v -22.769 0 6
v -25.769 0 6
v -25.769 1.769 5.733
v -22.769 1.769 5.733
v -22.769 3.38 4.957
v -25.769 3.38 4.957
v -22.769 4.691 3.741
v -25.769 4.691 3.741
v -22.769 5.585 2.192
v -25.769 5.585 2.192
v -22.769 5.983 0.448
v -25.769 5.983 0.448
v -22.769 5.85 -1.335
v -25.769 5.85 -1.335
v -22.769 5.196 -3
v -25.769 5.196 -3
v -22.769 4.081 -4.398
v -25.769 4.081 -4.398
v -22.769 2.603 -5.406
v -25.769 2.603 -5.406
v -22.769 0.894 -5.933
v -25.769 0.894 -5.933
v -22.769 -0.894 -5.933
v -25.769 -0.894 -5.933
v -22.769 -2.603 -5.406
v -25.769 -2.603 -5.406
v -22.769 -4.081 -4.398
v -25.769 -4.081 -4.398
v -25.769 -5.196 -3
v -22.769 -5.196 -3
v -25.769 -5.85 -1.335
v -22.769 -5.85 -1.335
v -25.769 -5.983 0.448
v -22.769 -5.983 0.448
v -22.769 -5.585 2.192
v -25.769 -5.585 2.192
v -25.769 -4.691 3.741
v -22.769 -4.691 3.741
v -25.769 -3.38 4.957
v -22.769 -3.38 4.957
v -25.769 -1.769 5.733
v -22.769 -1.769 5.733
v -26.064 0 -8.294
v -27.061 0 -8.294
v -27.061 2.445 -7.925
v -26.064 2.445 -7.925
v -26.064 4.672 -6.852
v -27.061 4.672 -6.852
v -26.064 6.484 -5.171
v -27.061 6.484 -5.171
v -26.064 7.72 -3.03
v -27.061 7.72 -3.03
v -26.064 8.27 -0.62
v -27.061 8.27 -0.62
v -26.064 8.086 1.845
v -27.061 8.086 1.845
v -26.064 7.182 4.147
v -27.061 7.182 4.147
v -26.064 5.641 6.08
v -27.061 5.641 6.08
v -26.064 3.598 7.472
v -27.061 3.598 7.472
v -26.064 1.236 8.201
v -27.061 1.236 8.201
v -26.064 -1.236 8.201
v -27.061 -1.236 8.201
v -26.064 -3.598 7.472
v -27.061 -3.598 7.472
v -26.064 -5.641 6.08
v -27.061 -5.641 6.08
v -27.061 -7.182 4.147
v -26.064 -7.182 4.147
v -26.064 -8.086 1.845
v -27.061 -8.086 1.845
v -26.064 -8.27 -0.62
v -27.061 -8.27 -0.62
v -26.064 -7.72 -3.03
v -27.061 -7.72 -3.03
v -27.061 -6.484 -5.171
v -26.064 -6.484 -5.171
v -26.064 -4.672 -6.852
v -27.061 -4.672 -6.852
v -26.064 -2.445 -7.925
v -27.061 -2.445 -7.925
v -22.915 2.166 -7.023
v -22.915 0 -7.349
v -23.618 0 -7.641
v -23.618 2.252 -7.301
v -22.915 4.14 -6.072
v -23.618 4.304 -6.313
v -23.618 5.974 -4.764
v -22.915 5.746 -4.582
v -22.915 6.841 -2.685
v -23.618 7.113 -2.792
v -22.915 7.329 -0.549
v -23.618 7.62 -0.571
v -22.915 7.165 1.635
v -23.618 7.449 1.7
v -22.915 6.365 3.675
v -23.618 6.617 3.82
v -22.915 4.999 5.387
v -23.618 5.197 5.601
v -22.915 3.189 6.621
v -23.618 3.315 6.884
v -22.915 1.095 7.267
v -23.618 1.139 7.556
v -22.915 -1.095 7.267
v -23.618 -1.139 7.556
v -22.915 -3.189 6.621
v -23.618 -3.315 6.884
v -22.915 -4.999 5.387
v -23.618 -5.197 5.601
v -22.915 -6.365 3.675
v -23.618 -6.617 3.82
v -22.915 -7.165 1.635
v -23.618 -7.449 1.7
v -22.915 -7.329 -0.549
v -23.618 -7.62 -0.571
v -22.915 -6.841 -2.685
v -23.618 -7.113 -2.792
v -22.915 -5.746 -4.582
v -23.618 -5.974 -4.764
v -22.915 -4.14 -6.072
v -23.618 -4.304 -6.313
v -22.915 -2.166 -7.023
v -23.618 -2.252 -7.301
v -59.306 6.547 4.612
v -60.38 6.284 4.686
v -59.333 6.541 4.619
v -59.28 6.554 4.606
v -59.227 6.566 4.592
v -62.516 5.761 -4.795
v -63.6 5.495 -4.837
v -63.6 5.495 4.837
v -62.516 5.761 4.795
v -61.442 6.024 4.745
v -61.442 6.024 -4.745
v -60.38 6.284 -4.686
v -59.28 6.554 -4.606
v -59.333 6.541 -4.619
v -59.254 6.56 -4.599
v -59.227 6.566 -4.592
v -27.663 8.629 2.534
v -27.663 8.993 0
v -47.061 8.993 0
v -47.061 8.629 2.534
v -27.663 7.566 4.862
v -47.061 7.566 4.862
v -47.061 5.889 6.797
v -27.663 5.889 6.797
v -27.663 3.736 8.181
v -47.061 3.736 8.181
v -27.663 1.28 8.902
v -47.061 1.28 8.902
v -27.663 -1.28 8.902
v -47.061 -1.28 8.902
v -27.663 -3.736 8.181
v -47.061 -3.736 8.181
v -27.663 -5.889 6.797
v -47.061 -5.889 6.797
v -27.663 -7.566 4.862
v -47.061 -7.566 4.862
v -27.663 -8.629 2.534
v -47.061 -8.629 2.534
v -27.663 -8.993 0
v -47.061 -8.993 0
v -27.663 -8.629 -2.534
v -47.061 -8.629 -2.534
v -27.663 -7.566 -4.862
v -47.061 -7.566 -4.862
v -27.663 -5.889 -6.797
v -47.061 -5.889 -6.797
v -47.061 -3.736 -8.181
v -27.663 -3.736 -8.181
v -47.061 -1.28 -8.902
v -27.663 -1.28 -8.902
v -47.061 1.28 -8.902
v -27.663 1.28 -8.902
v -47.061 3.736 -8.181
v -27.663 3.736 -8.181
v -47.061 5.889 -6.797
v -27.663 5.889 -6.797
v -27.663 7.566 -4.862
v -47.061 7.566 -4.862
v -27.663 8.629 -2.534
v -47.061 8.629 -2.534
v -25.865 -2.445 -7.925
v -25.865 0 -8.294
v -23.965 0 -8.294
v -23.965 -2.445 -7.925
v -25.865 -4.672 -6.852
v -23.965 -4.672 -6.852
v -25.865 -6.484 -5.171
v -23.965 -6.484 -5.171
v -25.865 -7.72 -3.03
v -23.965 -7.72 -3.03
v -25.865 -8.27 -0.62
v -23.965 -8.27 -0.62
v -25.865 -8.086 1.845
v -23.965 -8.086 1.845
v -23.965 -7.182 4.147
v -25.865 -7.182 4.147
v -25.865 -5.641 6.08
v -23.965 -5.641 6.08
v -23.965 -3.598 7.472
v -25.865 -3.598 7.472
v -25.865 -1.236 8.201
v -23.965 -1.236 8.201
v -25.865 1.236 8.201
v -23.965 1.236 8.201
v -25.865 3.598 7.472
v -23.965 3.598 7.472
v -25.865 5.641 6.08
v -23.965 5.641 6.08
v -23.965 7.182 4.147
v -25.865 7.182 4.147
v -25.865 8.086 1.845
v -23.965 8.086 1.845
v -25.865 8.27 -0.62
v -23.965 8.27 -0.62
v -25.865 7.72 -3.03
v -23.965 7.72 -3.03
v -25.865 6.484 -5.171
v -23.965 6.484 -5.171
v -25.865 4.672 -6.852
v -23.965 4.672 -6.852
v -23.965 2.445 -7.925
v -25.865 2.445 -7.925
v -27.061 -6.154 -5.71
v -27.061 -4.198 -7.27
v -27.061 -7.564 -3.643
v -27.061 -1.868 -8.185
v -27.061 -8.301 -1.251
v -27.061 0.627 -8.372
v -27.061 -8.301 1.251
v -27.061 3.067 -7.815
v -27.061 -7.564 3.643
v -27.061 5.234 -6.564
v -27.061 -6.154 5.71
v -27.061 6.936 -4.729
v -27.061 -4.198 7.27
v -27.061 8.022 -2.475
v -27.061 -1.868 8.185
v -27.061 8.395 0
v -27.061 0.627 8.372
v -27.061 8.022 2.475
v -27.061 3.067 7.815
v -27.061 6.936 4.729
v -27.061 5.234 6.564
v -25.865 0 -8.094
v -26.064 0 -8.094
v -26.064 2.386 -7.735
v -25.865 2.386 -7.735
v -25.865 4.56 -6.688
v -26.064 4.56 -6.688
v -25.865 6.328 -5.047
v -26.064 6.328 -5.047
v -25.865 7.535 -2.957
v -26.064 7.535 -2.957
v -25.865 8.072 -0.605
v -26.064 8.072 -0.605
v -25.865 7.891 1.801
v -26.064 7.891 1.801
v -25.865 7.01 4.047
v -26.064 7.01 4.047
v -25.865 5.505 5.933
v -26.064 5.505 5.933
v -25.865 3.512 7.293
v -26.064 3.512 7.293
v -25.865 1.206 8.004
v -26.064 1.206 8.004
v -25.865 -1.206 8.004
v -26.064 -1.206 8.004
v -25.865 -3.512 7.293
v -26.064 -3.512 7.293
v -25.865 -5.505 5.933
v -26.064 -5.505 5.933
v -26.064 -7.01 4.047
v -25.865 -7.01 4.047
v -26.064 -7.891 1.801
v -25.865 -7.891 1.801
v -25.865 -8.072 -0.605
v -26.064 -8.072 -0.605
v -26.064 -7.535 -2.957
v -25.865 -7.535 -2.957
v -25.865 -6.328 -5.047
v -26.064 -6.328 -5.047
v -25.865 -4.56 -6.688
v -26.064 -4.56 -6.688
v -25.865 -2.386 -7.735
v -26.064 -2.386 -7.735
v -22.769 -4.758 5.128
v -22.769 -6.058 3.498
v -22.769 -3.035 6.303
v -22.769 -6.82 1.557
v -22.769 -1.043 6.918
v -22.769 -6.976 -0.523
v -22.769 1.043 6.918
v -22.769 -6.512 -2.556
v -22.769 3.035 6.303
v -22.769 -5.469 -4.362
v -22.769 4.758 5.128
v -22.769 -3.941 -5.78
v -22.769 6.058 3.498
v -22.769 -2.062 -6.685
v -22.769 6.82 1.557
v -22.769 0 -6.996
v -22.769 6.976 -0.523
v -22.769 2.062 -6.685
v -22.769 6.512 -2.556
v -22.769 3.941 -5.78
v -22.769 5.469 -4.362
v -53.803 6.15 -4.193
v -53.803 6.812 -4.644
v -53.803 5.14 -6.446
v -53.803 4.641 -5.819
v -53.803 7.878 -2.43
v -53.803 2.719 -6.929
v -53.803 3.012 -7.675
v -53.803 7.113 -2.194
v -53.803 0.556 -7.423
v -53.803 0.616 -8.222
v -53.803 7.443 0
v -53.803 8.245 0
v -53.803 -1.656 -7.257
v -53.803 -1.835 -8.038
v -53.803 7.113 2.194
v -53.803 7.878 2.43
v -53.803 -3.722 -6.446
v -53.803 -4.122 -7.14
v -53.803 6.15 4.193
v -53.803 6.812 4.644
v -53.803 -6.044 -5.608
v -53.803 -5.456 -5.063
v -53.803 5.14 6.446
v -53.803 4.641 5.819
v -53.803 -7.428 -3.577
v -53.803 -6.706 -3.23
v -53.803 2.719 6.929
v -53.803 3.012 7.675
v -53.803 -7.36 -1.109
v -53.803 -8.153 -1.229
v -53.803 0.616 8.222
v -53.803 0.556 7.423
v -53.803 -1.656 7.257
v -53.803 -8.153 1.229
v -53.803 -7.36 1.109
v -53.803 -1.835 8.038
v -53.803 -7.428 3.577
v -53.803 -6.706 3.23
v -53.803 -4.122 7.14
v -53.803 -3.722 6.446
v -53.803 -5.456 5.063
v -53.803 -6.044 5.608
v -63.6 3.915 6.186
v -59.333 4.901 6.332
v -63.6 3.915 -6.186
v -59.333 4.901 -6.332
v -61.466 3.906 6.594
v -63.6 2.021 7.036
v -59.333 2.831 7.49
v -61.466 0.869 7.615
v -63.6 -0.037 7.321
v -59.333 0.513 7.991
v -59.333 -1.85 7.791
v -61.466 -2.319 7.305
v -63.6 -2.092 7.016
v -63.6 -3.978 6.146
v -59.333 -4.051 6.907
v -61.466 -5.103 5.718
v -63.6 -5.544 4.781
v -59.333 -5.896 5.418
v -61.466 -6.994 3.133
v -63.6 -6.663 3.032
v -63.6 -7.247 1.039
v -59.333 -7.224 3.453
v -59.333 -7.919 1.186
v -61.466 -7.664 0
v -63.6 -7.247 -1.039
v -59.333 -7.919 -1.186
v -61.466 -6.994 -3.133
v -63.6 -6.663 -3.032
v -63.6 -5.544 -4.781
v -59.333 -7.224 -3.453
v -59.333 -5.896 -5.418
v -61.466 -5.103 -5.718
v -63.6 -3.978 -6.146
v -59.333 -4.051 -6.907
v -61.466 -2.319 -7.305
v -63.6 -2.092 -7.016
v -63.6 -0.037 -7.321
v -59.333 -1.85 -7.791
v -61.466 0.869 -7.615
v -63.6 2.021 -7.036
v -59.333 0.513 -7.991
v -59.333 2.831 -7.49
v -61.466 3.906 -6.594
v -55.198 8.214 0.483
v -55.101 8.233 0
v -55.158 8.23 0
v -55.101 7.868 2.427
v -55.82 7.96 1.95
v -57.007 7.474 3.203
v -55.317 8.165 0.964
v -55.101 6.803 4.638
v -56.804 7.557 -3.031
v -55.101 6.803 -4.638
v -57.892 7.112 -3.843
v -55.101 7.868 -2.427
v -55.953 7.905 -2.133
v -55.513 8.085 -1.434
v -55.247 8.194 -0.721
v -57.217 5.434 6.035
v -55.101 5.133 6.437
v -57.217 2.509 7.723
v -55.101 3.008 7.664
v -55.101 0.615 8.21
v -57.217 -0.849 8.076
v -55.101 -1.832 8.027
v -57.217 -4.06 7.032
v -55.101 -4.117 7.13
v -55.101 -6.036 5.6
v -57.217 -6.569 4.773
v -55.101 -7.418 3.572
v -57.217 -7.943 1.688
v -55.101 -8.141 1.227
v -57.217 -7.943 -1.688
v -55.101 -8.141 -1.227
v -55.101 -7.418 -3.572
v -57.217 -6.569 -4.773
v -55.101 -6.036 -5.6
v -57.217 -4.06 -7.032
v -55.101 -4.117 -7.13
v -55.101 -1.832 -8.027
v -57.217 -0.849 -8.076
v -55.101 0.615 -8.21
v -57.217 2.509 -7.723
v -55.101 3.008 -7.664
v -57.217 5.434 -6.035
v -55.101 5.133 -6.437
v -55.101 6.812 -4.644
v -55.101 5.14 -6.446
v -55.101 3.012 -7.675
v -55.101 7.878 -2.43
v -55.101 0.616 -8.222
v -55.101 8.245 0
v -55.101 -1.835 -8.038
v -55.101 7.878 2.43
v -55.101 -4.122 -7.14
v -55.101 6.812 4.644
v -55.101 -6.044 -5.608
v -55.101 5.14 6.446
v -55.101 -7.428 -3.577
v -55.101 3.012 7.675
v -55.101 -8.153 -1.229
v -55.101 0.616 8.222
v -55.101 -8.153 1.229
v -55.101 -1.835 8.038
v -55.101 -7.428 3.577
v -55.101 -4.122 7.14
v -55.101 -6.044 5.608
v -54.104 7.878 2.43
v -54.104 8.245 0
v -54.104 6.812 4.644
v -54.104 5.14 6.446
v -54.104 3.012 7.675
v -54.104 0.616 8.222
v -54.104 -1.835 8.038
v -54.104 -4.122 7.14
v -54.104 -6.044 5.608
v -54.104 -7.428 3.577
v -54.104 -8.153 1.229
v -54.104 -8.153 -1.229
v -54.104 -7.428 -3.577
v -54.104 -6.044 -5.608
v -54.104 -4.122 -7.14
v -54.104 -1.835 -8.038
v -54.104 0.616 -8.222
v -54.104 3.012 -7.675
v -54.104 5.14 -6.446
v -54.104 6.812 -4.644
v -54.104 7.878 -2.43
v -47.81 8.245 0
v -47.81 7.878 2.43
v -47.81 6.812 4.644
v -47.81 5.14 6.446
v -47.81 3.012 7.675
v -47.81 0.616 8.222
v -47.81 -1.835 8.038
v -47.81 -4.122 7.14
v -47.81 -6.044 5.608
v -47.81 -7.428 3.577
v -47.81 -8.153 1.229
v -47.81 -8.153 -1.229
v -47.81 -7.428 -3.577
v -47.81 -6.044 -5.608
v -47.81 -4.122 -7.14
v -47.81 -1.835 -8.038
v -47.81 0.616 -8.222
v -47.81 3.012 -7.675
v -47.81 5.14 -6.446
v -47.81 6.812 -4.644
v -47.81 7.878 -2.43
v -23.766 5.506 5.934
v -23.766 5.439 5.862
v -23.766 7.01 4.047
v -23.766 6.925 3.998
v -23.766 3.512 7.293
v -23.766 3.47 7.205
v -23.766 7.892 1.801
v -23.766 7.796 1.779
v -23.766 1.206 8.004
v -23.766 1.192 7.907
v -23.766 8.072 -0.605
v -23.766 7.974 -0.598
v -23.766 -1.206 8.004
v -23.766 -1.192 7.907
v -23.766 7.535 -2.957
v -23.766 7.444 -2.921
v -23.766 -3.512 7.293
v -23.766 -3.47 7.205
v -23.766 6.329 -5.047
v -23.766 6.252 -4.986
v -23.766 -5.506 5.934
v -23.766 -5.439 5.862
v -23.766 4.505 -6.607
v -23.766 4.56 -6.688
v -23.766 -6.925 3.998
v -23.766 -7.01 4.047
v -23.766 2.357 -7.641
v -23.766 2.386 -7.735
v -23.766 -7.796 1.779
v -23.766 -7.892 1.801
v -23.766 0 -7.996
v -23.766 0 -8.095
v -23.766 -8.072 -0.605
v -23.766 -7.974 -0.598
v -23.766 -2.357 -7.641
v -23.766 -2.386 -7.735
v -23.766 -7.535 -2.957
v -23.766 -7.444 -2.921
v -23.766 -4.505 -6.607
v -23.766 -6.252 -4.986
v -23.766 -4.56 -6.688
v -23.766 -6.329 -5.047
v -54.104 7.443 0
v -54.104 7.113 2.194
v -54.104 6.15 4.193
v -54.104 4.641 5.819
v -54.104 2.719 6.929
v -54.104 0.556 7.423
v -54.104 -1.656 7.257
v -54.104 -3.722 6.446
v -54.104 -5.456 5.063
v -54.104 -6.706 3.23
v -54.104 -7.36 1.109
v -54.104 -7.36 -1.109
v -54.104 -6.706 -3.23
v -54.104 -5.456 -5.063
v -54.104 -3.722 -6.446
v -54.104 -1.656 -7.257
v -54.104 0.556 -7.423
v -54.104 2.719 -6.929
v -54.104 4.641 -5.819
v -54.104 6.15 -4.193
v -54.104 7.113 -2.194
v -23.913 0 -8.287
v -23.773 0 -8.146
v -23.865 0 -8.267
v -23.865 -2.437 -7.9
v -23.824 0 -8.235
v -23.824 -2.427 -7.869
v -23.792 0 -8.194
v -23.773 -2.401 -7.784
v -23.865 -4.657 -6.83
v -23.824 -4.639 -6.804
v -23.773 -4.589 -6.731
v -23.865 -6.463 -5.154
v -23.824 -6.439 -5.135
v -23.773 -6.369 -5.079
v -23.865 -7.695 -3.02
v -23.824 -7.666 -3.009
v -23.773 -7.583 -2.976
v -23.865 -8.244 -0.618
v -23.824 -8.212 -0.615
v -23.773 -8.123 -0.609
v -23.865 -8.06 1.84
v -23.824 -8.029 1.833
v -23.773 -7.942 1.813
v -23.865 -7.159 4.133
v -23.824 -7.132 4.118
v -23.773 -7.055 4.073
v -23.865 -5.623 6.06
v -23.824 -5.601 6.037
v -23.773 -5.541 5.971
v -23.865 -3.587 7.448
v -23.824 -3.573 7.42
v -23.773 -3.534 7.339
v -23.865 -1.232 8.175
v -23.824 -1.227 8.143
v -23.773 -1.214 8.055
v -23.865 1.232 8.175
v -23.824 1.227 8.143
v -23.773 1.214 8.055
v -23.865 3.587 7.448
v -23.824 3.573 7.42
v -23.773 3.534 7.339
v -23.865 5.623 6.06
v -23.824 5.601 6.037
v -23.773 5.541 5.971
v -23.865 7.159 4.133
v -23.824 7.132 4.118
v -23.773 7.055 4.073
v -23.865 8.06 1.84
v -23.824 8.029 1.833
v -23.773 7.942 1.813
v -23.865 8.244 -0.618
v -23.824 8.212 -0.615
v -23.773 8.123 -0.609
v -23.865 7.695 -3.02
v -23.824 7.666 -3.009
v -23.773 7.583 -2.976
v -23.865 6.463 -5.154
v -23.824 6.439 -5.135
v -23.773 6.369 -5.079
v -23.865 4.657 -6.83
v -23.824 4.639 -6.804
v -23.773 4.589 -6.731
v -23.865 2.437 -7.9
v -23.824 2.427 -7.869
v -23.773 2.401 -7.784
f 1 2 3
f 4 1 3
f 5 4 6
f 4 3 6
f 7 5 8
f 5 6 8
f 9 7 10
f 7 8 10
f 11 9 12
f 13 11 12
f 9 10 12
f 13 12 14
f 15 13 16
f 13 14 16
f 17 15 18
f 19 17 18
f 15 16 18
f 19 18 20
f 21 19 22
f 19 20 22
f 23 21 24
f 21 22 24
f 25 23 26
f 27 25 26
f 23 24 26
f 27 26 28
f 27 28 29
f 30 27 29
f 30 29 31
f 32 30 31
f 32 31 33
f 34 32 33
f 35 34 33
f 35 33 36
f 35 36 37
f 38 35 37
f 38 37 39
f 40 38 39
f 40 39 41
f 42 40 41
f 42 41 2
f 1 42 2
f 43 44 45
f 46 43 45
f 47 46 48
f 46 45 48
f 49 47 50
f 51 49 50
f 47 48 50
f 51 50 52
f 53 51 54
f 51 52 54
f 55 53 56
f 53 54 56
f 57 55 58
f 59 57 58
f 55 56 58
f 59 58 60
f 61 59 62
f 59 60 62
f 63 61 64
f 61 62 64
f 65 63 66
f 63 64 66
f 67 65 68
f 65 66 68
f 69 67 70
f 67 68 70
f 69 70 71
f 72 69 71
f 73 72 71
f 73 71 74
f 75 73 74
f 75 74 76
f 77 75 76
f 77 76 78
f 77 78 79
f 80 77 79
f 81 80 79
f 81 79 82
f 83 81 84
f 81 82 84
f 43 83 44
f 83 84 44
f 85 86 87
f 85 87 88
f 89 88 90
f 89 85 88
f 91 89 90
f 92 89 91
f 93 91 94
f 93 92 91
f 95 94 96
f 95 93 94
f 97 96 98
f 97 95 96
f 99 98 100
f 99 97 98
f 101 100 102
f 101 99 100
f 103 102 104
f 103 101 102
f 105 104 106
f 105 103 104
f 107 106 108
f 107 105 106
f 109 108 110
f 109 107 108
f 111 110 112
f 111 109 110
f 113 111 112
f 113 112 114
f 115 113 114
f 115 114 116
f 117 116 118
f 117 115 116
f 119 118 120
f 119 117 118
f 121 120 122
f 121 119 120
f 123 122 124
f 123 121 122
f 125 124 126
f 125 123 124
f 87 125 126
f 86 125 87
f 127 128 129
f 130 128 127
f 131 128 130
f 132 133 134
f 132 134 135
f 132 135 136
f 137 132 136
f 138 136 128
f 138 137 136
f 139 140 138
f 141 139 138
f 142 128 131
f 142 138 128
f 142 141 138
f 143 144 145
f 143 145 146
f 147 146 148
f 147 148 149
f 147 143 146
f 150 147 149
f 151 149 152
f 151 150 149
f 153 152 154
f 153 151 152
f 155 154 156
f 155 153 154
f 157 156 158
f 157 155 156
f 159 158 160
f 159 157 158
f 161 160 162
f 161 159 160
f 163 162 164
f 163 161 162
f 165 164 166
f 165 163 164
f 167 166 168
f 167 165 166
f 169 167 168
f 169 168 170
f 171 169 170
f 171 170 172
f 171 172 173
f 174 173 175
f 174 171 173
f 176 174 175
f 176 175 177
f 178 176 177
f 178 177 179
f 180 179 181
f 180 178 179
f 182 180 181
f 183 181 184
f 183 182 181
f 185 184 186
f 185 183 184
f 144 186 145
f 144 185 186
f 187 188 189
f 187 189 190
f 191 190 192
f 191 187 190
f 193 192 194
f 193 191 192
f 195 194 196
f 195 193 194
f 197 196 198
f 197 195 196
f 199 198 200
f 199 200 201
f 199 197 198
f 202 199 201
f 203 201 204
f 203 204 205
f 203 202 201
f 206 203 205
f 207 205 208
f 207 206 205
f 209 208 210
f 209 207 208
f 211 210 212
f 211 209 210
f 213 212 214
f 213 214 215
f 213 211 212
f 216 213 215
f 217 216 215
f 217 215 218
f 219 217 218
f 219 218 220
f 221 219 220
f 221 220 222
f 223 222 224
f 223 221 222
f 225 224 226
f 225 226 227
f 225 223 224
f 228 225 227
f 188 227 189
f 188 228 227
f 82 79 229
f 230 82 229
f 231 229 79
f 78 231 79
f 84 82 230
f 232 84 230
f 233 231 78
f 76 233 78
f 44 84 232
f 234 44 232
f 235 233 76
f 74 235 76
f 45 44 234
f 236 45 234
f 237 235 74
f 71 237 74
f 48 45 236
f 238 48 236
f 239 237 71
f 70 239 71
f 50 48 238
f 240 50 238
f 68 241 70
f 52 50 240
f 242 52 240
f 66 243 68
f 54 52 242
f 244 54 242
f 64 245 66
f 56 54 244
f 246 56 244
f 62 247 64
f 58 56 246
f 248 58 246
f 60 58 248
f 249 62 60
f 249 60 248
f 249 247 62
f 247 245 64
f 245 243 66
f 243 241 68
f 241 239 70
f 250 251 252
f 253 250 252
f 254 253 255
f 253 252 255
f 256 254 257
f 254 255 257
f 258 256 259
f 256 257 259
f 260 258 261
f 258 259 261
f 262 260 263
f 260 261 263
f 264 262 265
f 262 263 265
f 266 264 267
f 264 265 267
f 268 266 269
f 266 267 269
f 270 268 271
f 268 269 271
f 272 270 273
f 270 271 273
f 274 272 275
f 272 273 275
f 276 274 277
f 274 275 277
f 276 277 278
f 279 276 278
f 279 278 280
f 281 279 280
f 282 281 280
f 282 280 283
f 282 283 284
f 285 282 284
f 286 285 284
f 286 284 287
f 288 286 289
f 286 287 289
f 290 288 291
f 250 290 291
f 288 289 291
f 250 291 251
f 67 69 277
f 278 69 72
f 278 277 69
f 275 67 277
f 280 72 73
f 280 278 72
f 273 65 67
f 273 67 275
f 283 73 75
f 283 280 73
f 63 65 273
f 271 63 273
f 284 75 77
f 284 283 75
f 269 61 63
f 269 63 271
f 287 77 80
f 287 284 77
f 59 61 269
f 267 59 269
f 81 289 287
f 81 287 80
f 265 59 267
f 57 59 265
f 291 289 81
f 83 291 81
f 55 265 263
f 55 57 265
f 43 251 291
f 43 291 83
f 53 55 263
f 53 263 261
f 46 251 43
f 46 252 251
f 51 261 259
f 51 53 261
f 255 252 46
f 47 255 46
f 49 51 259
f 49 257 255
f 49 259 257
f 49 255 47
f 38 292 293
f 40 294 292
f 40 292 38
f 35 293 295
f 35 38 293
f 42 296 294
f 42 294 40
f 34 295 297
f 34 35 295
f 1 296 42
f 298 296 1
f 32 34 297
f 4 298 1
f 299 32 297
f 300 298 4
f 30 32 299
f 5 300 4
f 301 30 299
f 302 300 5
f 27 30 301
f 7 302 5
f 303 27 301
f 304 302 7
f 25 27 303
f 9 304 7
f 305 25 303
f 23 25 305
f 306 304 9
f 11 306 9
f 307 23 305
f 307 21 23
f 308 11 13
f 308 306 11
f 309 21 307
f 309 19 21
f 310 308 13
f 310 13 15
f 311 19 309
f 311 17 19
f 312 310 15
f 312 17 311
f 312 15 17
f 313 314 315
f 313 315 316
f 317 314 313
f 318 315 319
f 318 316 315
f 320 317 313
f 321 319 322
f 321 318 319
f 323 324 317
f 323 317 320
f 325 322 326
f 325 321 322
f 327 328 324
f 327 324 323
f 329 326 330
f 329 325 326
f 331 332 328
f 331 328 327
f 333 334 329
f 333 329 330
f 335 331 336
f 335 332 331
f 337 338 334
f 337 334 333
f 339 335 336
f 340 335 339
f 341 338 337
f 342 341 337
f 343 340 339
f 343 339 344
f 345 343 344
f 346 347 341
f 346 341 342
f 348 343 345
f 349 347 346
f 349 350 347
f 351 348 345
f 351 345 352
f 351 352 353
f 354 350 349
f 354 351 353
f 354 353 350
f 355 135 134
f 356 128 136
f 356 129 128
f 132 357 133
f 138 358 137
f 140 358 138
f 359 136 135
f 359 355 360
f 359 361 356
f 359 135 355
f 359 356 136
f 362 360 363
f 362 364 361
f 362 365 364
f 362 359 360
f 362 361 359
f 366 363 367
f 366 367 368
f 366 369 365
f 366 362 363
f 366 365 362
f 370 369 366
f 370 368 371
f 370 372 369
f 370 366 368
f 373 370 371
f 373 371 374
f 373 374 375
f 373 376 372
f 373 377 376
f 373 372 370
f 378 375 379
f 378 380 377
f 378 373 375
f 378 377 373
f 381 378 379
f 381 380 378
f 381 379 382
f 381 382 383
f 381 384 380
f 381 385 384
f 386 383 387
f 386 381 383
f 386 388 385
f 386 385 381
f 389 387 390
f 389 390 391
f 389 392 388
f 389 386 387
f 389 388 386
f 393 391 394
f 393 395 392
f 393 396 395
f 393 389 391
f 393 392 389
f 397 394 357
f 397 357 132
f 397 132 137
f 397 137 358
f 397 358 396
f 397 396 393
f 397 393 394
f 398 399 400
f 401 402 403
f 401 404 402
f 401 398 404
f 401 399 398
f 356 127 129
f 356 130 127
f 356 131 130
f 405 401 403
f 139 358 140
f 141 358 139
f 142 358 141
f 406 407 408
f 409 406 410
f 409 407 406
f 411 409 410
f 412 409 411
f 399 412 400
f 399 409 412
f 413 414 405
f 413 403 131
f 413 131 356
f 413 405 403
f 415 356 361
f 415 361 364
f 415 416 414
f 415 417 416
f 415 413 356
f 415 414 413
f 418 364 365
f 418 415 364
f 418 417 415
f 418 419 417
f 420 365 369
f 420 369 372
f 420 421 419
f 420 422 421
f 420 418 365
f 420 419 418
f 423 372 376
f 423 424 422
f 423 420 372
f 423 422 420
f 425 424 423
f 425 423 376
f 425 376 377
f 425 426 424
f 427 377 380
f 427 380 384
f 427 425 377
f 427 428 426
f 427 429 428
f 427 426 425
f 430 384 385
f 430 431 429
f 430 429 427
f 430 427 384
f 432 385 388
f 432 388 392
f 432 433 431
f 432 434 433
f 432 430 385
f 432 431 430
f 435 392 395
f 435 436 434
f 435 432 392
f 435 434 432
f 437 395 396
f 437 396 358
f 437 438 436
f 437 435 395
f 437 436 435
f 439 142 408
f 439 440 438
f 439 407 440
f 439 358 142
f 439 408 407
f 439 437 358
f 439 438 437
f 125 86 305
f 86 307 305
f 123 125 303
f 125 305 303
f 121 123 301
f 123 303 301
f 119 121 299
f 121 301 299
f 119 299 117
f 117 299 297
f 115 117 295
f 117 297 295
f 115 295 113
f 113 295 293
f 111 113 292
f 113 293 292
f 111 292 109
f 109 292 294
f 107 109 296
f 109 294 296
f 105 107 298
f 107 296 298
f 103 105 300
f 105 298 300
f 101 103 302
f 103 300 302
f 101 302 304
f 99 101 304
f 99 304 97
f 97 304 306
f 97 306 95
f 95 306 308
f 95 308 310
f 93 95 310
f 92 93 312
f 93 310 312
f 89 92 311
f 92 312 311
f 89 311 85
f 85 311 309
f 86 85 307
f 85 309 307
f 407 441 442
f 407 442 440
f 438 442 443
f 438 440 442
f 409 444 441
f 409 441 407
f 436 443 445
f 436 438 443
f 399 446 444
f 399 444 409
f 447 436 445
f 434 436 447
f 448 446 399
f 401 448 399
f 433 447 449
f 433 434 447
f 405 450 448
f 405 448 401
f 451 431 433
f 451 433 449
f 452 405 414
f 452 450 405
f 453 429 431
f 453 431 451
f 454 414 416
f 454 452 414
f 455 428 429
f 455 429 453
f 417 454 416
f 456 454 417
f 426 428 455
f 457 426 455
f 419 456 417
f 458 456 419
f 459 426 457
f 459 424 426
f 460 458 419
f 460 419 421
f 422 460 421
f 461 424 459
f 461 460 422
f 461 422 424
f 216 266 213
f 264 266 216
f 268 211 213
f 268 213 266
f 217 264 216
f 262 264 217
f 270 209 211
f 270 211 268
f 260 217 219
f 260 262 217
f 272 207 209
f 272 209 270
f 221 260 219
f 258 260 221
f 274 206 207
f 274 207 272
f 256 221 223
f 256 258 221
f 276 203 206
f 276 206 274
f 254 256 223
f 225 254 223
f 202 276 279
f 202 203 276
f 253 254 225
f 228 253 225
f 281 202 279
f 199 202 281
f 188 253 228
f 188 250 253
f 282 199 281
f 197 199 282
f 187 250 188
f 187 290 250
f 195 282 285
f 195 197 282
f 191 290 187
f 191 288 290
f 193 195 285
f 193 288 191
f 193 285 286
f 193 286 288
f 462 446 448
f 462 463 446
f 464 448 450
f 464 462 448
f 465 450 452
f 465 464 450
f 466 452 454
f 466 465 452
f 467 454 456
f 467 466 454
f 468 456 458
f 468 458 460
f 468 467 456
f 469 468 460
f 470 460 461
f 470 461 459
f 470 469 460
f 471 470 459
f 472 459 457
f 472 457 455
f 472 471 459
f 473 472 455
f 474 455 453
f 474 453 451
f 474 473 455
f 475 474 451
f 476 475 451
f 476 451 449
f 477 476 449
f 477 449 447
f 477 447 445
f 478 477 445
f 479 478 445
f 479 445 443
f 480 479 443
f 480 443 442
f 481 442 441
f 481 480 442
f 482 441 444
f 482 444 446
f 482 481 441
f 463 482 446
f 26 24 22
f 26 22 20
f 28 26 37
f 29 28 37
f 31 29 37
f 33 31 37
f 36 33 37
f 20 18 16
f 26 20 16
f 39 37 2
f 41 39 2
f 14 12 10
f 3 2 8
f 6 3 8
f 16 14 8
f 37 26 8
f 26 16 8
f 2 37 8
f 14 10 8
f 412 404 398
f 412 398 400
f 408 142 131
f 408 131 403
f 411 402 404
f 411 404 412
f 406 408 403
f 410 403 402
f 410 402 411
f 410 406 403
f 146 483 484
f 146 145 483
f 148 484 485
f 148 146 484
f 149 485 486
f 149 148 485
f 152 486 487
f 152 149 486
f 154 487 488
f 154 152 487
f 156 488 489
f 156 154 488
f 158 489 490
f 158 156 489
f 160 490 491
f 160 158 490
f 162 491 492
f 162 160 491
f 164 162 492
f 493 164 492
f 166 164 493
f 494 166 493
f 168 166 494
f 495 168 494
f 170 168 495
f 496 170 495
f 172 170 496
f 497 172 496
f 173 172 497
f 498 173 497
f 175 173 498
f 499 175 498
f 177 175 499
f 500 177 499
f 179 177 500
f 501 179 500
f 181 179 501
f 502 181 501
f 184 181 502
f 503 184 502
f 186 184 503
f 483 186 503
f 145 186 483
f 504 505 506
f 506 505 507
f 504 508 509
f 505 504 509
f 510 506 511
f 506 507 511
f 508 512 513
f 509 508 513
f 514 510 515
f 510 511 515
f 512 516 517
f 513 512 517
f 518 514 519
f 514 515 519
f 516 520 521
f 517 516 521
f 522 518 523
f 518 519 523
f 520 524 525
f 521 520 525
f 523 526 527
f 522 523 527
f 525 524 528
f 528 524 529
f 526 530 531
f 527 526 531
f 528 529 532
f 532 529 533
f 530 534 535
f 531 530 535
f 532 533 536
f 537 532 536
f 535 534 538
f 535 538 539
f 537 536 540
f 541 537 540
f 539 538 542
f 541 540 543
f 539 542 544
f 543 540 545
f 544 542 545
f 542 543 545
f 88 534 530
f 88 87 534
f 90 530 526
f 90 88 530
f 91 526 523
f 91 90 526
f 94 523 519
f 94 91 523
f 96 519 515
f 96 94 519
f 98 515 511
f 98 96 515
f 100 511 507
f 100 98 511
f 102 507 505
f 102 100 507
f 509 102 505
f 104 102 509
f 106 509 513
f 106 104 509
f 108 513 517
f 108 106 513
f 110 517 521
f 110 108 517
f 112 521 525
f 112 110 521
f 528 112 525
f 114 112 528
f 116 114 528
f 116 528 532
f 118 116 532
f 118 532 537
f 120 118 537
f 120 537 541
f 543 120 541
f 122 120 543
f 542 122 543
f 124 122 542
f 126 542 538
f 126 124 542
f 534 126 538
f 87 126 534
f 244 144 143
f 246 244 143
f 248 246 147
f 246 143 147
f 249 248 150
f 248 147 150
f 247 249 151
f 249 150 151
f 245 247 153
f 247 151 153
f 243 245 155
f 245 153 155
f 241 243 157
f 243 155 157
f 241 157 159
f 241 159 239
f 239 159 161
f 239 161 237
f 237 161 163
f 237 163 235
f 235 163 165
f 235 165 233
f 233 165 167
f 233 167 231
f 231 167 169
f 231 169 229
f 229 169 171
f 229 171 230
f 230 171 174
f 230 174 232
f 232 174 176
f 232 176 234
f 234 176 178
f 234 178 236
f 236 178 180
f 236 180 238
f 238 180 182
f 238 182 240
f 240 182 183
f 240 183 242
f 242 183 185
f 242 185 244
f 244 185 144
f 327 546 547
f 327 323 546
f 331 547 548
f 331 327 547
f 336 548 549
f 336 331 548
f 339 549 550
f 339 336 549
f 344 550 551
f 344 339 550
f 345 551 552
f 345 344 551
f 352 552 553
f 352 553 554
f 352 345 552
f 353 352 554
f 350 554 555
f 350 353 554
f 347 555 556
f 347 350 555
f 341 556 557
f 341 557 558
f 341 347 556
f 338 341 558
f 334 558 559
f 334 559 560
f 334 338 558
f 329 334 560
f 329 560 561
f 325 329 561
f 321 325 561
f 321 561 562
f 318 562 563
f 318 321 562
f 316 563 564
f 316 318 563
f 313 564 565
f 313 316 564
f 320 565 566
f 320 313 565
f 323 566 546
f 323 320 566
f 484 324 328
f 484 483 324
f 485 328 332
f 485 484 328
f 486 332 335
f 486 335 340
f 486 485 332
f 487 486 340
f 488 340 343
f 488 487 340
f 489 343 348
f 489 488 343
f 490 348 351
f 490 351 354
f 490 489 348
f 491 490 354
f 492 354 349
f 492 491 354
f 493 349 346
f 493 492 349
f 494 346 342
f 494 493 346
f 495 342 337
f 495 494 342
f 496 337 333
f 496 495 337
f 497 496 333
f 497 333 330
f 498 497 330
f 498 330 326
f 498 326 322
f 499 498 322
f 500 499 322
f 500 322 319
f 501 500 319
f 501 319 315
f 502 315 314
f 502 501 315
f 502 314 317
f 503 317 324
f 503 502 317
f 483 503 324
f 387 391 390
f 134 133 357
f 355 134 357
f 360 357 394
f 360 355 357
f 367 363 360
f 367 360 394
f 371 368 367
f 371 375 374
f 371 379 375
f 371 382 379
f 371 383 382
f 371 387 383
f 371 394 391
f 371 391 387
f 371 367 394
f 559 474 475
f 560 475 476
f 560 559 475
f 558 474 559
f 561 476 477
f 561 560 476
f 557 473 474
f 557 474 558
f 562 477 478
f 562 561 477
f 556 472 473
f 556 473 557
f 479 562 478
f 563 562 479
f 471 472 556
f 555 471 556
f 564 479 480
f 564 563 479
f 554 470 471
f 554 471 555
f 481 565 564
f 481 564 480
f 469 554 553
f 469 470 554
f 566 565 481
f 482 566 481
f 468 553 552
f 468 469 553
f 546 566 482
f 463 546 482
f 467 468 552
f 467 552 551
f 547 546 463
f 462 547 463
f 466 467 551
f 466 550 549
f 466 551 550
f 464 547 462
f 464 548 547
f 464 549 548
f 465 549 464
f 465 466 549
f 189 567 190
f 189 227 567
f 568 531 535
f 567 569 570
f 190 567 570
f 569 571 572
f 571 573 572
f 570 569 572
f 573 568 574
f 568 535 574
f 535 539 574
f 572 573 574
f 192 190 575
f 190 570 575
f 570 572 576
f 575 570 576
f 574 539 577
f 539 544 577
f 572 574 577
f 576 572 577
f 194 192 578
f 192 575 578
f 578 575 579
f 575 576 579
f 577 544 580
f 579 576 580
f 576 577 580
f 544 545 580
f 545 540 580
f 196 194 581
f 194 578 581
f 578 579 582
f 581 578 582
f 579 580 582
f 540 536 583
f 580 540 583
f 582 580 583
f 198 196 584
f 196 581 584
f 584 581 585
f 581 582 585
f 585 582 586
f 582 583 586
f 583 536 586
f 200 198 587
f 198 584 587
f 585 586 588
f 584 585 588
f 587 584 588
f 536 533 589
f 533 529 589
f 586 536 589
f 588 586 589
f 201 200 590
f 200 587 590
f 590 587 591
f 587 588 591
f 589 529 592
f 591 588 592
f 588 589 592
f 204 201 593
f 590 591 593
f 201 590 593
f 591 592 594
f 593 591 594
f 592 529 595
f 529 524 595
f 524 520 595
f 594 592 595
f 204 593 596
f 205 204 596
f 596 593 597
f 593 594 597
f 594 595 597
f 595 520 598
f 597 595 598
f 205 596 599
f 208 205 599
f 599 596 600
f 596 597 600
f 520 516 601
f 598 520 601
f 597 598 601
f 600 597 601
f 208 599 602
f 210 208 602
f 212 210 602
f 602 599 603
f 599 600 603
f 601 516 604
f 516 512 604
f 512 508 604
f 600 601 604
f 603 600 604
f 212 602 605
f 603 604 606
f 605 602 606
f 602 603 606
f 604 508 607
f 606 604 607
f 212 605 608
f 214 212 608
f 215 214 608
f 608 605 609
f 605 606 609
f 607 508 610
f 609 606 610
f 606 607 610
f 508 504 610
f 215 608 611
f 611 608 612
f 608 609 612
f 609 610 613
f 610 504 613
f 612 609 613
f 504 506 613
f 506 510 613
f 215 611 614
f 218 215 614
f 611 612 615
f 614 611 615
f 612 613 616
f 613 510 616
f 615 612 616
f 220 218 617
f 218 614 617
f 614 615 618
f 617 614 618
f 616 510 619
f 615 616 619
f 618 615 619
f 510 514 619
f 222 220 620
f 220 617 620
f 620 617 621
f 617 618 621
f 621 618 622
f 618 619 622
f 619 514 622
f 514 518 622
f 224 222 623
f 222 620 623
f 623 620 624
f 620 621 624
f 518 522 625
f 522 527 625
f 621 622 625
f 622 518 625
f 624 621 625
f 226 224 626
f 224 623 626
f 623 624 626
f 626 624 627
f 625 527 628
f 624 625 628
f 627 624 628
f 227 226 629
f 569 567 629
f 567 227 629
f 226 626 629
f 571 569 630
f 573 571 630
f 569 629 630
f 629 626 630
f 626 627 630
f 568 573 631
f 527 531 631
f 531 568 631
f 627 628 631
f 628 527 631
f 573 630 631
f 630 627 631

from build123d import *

# Parameters (mm, degrees)
SALIENTE_EXTRUIR1_START             = -7.320816359
SALIENTE_EXTRUIR1_3_DEPTH           = 14.641632718
CROQUIS2_R                          = 8.293601056
SALIENTE_EXTRUIR2_DEPTH             = 0.996962704
CROQUIS3_R                          = 8.094208515
SALIENTE_EXTRUIR3_DEPTH             = 0.199392541
CROQUIS4_R                          = 8.293601056
SALIENTE_EXTRUIR4_DEPTH             = 2.099264862
CROQUIS6_R                          = 7.996393307
SALIENTE_EXTRUIR6_DEPTH             = 0.147505067
SALIENTE_EXTRUIR6_TAPER             = 67.466749921
CROQUIS7_R                          = 7.640868273
SALIENTE_EXTRUIR7_DEPTH             = 0.849457636
SALIENTE_EXTRUIR7_TAPER             = 22.533250079
DI_METRO_DE_TALADRO_12_0_12_1_D     = 12
DI_METRO_DE_TALADRO_12_0_12_1_DEPTH = 3
CHAFL_N1_SIZE                       = 0.598177622
CHAFL_N1_SIZE2                      = 0.601939746
CHAFL_N2_SIZE                       = 0.158849839
CHAFL_N2_SIZE_2                     = 0.292765242
REDONDEO1_R                         = 0.199050823


with BuildPart() as part:
    # Saliente-Extruir1: read off the stored shape, not the designer's step
    # Saliente-Extruir1 outline → Saliente-Extruir1 (revolve)
    with BuildSketch(Plane.YX):
        Polygon((8.99335601, -27.061359261), (0, -27.061359261), (0, -55.101016987), (8.244693452, -55.101016987), (8.244693452, -54.104054283), (7.443361166, -54.104054283), (7.443361166, -53.803084411), (8.244693452, -53.803084411), (8.244693452, -47.810021819), (8.99335601, -47.061359261), align=None)
    revolve(axis=Axis((0, 0, 0), (1, 0, 0)))

    # Saliente-Extruir1 2 outline → Saliente-Extruir1 2 (revolve)
    with BuildSketch(Plane.YX):
        Polygon((0, -55.101016987), (0, -63.6), (7.320816359, -63.6), (8.007236046, -59.33292836), (8.233407082, -55.101016987), align=None)
    revolve(axis=Axis((0, 0, 0), (1, 0, 0)))

    # Saliente-Extruir1 3 outline → Saliente-Extruir1 3 (cut)
    with BuildSketch(Plane.XY.offset(SALIENTE_EXTRUIR1_START)):
        Polygon((-63.6, 5.495125364), (-59.227359982, 6.566499061), (-55.157899775, 8.230367028), (-54, 8.70379403), (-54, 10), (-63.6, 10), align=None)
    extrude(amount=SALIENTE_EXTRUIR1_3_DEPTH, mode=Mode.SUBTRACT)

    # Croquis2 → Saliente-Extruir2 (add)
    with BuildSketch(Plane(origin=(-27.061359261, 0, 0), x_dir=(0, 0, -1), z_dir=(1, 0, 0))):
        Circle(CROQUIS2_R)
    extrude(amount=SALIENTE_EXTRUIR2_DEPTH)

    # Croquis3 → Saliente-Extruir3 (add)
    with BuildSketch(Plane(origin=(-26.064396557, 0, 0), x_dir=(0, 0, -1), z_dir=(1, 0, 0))):
        Circle(CROQUIS3_R)
    extrude(amount=SALIENTE_EXTRUIR3_DEPTH)

    # Croquis4 → Saliente-Extruir4 (add)
    with BuildSketch(Plane(origin=(-25.865004017, 0, 0), x_dir=(0, -1, 0), z_dir=(-1, 0, 0))):
        with Locations(Location((0, 0, 0), (0, 0, 270))):
            Circle(CROQUIS4_R)
    extrude(amount=-SALIENTE_EXTRUIR4_DEPTH)

    # Croquis6 → Saliente-Extruir6 (add)
    with BuildSketch(Plane(origin=(-23.765739154, 0, 0), x_dir=(0, 0, -1), z_dir=(1, 0, 0))):
        Circle(CROQUIS6_R)
    extrude(amount=SALIENTE_EXTRUIR6_DEPTH, taper=SALIENTE_EXTRUIR6_TAPER)

    # Croquis7 → Saliente-Extruir7 (add)
    with BuildSketch(Plane(origin=(-23.618234087, 0, 0), x_dir=(0, 0, -1), z_dir=(1, 0, 0))):
        Circle(CROQUIS7_R)
    extrude(amount=SALIENTE_EXTRUIR7_DEPTH, taper=SALIENTE_EXTRUIR7_TAPER)

    # Diámetro de taladro Ø12.0 (12)1
    with Locations(Plane(origin=(-22.768776451, 0, 0), x_dir=(0, 0, -1), z_dir=(1, 0, 0))):
        with Locations((0, 0)):
            Hole(DI_METRO_DE_TALADRO_12_0_12_1_D / 2, depth=DI_METRO_DE_TALADRO_12_0_12_1_DEPTH)

    # Chaflán1
    chafl_n1_edges = [part.edges().sort_by_distance(p)[0] for p in [
        (-27.061359261, -8.99335601, 0),
    ]]
    chafl_n1_side = [part.faces().sort_by_distance(p)[0] for p in [
        (-27.061359261, -8.738985489, 0),
    ]]
    chamfer(chafl_n1_edges, length=CHAFL_N1_SIZE, length2=CHAFL_N1_SIZE2, reference=chafl_n1_side[0])

    # Chaflán2
    # the kernel refuses this chamfer: 0.292765242, 0.158849839 mm, written as the material it takes off along each edge
    with BuildSketch(Plane(origin=(-22.768776451, 0, 0), x_dir=(0, 0, -1), z_dir=(0, 1, 0))) as chafl_n2_piece_1:
        Polygon((7.288433722 + CHAFL_N2_SIZE * 0.38321951697, CHAFL_N2_SIZE * 0.923657297312), (7.288433722 - CHAFL_N2_SIZE_2, 0), (7.288433722, 0), align=None)
    revolve(axis=Axis((-22.768776451, 0, 0), (-1, 0, 0)), mode=Mode.SUBTRACT)

    # Redondeo1
    redondeo1_edges = [part.edges().sort_by_distance(p)[0] for p in [
        (-23.765739154, 0, 8.293601056),
    ]]
    fillet(redondeo1_edges, radius=REDONDEO1_R)


solid = part.part
